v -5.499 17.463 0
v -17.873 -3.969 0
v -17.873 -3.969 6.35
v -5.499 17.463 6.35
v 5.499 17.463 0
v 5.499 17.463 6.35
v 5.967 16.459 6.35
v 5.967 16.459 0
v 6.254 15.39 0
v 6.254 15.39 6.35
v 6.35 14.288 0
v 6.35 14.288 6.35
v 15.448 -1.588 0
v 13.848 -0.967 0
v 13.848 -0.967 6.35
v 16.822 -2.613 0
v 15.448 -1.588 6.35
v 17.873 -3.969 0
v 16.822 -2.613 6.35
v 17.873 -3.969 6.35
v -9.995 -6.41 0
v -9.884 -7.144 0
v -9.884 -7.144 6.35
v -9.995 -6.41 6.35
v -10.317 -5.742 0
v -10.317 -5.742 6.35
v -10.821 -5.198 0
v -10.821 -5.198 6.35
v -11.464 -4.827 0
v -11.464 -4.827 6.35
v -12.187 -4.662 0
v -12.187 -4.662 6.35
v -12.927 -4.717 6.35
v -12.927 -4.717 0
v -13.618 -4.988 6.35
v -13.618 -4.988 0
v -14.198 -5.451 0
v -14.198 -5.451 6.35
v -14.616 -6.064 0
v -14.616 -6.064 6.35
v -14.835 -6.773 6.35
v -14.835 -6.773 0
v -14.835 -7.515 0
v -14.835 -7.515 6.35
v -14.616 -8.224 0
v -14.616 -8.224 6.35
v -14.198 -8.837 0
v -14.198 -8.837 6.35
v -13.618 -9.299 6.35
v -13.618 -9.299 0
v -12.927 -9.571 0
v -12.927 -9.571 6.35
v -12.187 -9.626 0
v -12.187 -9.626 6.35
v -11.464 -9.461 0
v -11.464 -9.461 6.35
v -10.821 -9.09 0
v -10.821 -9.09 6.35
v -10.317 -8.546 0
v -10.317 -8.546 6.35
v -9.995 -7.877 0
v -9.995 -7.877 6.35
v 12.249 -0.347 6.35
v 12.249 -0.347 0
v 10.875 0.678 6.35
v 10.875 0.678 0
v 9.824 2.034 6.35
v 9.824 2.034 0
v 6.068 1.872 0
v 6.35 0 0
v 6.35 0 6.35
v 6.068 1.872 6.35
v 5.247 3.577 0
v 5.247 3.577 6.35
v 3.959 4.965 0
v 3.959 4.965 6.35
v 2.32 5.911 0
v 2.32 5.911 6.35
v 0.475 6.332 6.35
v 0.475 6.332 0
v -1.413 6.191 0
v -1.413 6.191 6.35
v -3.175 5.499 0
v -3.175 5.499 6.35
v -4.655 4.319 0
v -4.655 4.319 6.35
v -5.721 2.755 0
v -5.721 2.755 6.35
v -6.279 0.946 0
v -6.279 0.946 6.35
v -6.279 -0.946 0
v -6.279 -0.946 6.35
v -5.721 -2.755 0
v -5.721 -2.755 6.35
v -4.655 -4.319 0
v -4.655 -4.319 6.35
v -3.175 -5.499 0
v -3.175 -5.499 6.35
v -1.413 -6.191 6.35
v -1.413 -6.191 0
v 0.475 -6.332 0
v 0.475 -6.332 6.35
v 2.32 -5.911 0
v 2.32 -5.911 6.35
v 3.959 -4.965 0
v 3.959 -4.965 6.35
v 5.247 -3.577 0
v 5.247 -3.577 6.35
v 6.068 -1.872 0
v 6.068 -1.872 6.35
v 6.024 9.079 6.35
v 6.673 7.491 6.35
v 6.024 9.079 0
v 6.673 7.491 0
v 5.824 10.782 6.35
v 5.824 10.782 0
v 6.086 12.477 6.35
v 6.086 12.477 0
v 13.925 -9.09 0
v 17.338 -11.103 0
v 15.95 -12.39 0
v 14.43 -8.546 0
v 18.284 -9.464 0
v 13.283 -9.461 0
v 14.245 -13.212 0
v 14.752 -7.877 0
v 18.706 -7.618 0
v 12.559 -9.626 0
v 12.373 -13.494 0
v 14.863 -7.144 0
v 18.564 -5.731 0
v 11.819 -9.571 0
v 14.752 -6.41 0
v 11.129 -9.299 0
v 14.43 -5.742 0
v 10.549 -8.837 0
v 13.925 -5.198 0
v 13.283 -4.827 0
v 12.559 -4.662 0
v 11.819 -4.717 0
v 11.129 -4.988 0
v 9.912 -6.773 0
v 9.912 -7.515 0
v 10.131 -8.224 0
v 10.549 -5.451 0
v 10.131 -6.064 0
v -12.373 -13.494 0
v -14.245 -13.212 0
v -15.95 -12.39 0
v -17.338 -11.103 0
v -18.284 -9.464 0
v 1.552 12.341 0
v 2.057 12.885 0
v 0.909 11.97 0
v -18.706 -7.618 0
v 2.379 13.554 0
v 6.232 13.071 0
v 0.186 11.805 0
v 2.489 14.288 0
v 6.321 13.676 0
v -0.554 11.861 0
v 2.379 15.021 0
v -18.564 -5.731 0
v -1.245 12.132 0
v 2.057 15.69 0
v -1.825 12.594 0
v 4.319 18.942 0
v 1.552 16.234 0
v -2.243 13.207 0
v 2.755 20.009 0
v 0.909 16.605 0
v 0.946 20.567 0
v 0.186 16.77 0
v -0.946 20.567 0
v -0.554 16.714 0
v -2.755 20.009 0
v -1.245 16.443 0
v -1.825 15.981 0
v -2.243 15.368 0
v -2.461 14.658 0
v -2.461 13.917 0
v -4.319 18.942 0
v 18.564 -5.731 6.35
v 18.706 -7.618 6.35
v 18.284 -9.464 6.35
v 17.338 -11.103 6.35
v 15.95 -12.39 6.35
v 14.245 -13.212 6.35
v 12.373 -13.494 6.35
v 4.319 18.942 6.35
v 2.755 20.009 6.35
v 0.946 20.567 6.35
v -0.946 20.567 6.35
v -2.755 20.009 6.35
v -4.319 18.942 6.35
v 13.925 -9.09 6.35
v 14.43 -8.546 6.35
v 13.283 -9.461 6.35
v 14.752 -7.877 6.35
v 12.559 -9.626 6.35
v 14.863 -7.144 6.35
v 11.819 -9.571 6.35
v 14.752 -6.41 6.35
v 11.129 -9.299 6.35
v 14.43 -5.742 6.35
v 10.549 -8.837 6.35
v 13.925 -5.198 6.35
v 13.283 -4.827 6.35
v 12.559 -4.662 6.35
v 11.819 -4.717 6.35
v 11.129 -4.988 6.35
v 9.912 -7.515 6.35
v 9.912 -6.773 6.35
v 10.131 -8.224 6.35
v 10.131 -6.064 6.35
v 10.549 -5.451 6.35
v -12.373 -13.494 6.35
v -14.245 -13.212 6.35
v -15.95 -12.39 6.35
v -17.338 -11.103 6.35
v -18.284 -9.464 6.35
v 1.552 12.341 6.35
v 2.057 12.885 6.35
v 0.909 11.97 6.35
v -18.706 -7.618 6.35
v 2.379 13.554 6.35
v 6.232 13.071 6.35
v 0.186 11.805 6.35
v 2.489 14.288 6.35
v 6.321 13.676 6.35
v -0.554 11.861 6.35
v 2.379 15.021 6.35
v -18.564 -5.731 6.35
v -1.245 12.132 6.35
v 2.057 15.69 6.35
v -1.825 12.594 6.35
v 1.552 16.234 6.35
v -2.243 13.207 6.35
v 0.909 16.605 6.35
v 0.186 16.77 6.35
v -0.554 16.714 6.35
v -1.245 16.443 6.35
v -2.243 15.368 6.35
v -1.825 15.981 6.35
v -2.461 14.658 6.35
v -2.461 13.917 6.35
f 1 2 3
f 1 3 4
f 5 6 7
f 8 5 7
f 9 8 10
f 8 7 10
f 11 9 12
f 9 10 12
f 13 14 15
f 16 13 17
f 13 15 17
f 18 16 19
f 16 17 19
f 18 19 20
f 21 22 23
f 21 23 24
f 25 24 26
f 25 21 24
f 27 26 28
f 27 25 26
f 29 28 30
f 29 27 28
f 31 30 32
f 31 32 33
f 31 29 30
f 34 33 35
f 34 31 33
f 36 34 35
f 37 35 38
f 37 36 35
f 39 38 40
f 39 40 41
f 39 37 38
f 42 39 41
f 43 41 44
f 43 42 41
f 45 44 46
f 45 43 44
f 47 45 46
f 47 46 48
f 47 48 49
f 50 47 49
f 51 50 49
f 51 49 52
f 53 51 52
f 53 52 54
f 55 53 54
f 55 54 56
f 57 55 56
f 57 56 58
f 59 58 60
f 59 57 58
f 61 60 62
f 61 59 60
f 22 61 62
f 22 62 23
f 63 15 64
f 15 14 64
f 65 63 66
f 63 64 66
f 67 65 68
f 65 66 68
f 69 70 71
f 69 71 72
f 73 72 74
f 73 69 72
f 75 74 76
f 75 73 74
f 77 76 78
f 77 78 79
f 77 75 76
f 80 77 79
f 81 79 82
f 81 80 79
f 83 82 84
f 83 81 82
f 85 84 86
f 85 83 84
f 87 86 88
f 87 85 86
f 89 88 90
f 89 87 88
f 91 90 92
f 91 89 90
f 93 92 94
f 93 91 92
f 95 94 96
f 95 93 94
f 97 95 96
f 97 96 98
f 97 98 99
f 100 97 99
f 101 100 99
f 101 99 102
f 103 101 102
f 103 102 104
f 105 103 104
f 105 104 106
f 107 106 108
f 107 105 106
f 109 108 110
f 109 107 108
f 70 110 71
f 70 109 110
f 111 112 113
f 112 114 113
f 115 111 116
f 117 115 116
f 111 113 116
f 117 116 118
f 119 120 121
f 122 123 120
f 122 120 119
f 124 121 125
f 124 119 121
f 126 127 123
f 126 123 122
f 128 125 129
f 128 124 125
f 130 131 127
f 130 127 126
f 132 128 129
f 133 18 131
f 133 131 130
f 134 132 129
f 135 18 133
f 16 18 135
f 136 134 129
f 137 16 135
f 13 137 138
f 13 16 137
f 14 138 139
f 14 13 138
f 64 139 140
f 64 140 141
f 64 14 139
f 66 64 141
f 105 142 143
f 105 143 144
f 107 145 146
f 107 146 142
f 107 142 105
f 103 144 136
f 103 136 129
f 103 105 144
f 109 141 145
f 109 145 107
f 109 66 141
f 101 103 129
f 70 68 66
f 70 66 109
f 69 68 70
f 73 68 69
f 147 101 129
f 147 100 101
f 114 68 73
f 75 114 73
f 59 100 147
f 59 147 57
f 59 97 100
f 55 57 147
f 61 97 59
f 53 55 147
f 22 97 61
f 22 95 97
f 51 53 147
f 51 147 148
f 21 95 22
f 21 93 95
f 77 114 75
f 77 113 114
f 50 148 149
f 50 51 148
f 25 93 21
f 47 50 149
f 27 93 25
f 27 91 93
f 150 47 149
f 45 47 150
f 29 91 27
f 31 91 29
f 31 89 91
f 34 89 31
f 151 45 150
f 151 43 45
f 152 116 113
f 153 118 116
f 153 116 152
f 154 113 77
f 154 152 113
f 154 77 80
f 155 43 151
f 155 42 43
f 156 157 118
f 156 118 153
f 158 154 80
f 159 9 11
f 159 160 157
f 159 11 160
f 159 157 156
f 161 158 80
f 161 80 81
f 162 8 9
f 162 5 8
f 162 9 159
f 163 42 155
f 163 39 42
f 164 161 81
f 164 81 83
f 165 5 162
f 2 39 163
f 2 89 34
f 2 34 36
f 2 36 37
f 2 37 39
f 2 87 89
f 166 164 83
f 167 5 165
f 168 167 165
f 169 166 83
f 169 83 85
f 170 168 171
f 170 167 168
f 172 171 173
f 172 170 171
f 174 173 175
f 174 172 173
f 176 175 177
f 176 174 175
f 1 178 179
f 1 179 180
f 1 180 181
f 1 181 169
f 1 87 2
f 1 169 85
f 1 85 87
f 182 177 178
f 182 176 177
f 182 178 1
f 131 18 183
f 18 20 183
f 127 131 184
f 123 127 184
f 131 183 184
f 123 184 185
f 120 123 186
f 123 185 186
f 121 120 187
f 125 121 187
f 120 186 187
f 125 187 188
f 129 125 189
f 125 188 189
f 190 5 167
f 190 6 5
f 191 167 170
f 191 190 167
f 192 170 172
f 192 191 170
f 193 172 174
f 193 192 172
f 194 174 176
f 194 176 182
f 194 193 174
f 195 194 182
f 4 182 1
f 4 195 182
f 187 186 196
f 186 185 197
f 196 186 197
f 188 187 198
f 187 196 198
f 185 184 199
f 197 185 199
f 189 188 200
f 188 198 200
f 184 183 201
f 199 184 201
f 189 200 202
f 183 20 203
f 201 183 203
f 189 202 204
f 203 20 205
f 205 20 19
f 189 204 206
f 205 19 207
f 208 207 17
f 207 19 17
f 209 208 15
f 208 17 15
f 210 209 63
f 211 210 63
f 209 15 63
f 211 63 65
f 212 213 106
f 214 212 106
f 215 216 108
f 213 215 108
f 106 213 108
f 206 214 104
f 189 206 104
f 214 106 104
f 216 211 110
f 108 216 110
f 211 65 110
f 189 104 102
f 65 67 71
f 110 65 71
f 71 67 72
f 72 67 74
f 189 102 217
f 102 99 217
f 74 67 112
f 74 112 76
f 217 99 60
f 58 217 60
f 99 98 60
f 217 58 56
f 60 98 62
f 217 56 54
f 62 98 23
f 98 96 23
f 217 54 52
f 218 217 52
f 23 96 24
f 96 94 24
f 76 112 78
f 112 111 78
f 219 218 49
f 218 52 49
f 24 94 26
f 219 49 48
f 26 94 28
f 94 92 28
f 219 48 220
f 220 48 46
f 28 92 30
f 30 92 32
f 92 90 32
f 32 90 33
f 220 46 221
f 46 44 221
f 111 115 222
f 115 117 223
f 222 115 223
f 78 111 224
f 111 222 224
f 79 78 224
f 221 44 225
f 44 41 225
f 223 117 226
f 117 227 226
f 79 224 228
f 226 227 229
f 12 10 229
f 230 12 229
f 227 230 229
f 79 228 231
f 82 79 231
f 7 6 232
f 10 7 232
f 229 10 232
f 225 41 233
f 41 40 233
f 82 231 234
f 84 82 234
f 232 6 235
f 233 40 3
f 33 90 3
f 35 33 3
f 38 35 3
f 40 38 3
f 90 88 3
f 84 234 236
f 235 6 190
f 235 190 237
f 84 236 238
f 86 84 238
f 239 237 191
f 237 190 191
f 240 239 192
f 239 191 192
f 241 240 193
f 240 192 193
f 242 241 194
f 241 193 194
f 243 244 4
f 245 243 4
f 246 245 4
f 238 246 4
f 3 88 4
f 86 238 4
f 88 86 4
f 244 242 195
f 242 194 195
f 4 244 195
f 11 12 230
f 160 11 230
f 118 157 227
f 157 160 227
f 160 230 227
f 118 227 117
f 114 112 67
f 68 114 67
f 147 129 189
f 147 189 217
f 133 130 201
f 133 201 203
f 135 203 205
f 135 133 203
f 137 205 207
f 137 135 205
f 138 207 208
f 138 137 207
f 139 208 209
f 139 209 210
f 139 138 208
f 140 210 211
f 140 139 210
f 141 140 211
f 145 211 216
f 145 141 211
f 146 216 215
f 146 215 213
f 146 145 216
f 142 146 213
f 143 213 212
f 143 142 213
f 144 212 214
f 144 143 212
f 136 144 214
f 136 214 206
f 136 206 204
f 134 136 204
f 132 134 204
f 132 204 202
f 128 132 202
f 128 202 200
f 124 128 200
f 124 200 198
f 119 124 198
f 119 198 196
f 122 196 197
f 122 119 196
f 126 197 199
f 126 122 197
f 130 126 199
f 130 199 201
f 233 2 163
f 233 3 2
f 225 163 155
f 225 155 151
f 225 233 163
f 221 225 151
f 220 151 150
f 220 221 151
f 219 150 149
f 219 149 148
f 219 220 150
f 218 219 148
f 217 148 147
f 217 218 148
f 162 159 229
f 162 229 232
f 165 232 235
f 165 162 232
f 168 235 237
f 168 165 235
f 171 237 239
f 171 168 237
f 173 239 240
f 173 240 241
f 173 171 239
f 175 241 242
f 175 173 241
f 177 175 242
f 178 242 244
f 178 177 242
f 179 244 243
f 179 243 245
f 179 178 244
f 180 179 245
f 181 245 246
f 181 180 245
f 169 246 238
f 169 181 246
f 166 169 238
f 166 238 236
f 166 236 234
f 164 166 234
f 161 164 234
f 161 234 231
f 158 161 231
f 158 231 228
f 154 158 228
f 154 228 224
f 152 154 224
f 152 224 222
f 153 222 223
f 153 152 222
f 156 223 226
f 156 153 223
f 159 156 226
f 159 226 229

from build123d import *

# Parameters (mm, degrees)
SKETCH1_R           = 6.35
SKETCH1_R_2         = 2.4892
BOSS_EXTRUDE1_DEPTH = 6.35
FILLET1_R           = 6.35
CUT_EXTRUDE1_DEPTH  = 29.579578207
FILLET2_R           = 6.35


with BuildPart() as part:
    # Sketch1 → Boss-Extrude1 (new body)
    with BuildSketch(Plane.XY):
        Polygon((0, 26.9875), (23.371860585, -13.49375), (-23.371860585, -13.49375), align=None)
        Circle(SKETCH1_R, mode=Mode.SUBTRACT)
        with Locations((0, 14.2875)):
            Circle(SKETCH1_R_2, mode=Mode.SUBTRACT)
        with Locations((12.373337957, -7.14375)):
            Circle(SKETCH1_R_2, mode=Mode.SUBTRACT)
        with Locations((-12.373337957, -7.14375)):
            Circle(SKETCH1_R_2, mode=Mode.SUBTRACT)
    extrude(amount=BOSS_EXTRUDE1_DEPTH)

    # Fillet1
    fillet1_edges = [part.edges().sort_by_distance(p)[0] for p in [
        (0, 26.9875, 3.175),
        (23.371860585, -13.49375, 3.175),
        (-23.371860585, -13.49375, 3.175),
    ]]
    fillet(fillet1_edges, radius=FILLET1_R)

    # Sketch2 → Cut-Extrude1 (cut, through all)
    with BuildSketch(Plane.XY.offset(6.35)):
        with BuildLine():
            ThreePointArc((6.35, 14.2875), (6.00448145, 12.221416141), (5.005526767, 10.38017332))
            Line((5.005526767, 10.38017332), (11.492257175, -0.85517332))
            ThreePointArc((11.492257175, -0.85517332), (15.1582056, -1.436998542), (17.872599271, -3.96875))
            Line((17.872599271, -3.96875), (5.499261314, 17.4625))
            ThreePointArc((5.499261314, 17.4625), (6.133628997, 15.931000936), (6.35, 14.2875))
        make_face()
    extrude(amount=-CUT_EXTRUDE1_DEPTH, mode=Mode.SUBTRACT)

    # Fillet2
    fillet2_edges = [part.edges().sort_by_distance(p)[0] for p in [
        (11.492257175, -0.85517332, 3.175),
        (5.005526767, 10.38017332, 3.175),
    ]]
    fillet(fillet2_edges, radius=FILLET2_R)


solid = part.part
